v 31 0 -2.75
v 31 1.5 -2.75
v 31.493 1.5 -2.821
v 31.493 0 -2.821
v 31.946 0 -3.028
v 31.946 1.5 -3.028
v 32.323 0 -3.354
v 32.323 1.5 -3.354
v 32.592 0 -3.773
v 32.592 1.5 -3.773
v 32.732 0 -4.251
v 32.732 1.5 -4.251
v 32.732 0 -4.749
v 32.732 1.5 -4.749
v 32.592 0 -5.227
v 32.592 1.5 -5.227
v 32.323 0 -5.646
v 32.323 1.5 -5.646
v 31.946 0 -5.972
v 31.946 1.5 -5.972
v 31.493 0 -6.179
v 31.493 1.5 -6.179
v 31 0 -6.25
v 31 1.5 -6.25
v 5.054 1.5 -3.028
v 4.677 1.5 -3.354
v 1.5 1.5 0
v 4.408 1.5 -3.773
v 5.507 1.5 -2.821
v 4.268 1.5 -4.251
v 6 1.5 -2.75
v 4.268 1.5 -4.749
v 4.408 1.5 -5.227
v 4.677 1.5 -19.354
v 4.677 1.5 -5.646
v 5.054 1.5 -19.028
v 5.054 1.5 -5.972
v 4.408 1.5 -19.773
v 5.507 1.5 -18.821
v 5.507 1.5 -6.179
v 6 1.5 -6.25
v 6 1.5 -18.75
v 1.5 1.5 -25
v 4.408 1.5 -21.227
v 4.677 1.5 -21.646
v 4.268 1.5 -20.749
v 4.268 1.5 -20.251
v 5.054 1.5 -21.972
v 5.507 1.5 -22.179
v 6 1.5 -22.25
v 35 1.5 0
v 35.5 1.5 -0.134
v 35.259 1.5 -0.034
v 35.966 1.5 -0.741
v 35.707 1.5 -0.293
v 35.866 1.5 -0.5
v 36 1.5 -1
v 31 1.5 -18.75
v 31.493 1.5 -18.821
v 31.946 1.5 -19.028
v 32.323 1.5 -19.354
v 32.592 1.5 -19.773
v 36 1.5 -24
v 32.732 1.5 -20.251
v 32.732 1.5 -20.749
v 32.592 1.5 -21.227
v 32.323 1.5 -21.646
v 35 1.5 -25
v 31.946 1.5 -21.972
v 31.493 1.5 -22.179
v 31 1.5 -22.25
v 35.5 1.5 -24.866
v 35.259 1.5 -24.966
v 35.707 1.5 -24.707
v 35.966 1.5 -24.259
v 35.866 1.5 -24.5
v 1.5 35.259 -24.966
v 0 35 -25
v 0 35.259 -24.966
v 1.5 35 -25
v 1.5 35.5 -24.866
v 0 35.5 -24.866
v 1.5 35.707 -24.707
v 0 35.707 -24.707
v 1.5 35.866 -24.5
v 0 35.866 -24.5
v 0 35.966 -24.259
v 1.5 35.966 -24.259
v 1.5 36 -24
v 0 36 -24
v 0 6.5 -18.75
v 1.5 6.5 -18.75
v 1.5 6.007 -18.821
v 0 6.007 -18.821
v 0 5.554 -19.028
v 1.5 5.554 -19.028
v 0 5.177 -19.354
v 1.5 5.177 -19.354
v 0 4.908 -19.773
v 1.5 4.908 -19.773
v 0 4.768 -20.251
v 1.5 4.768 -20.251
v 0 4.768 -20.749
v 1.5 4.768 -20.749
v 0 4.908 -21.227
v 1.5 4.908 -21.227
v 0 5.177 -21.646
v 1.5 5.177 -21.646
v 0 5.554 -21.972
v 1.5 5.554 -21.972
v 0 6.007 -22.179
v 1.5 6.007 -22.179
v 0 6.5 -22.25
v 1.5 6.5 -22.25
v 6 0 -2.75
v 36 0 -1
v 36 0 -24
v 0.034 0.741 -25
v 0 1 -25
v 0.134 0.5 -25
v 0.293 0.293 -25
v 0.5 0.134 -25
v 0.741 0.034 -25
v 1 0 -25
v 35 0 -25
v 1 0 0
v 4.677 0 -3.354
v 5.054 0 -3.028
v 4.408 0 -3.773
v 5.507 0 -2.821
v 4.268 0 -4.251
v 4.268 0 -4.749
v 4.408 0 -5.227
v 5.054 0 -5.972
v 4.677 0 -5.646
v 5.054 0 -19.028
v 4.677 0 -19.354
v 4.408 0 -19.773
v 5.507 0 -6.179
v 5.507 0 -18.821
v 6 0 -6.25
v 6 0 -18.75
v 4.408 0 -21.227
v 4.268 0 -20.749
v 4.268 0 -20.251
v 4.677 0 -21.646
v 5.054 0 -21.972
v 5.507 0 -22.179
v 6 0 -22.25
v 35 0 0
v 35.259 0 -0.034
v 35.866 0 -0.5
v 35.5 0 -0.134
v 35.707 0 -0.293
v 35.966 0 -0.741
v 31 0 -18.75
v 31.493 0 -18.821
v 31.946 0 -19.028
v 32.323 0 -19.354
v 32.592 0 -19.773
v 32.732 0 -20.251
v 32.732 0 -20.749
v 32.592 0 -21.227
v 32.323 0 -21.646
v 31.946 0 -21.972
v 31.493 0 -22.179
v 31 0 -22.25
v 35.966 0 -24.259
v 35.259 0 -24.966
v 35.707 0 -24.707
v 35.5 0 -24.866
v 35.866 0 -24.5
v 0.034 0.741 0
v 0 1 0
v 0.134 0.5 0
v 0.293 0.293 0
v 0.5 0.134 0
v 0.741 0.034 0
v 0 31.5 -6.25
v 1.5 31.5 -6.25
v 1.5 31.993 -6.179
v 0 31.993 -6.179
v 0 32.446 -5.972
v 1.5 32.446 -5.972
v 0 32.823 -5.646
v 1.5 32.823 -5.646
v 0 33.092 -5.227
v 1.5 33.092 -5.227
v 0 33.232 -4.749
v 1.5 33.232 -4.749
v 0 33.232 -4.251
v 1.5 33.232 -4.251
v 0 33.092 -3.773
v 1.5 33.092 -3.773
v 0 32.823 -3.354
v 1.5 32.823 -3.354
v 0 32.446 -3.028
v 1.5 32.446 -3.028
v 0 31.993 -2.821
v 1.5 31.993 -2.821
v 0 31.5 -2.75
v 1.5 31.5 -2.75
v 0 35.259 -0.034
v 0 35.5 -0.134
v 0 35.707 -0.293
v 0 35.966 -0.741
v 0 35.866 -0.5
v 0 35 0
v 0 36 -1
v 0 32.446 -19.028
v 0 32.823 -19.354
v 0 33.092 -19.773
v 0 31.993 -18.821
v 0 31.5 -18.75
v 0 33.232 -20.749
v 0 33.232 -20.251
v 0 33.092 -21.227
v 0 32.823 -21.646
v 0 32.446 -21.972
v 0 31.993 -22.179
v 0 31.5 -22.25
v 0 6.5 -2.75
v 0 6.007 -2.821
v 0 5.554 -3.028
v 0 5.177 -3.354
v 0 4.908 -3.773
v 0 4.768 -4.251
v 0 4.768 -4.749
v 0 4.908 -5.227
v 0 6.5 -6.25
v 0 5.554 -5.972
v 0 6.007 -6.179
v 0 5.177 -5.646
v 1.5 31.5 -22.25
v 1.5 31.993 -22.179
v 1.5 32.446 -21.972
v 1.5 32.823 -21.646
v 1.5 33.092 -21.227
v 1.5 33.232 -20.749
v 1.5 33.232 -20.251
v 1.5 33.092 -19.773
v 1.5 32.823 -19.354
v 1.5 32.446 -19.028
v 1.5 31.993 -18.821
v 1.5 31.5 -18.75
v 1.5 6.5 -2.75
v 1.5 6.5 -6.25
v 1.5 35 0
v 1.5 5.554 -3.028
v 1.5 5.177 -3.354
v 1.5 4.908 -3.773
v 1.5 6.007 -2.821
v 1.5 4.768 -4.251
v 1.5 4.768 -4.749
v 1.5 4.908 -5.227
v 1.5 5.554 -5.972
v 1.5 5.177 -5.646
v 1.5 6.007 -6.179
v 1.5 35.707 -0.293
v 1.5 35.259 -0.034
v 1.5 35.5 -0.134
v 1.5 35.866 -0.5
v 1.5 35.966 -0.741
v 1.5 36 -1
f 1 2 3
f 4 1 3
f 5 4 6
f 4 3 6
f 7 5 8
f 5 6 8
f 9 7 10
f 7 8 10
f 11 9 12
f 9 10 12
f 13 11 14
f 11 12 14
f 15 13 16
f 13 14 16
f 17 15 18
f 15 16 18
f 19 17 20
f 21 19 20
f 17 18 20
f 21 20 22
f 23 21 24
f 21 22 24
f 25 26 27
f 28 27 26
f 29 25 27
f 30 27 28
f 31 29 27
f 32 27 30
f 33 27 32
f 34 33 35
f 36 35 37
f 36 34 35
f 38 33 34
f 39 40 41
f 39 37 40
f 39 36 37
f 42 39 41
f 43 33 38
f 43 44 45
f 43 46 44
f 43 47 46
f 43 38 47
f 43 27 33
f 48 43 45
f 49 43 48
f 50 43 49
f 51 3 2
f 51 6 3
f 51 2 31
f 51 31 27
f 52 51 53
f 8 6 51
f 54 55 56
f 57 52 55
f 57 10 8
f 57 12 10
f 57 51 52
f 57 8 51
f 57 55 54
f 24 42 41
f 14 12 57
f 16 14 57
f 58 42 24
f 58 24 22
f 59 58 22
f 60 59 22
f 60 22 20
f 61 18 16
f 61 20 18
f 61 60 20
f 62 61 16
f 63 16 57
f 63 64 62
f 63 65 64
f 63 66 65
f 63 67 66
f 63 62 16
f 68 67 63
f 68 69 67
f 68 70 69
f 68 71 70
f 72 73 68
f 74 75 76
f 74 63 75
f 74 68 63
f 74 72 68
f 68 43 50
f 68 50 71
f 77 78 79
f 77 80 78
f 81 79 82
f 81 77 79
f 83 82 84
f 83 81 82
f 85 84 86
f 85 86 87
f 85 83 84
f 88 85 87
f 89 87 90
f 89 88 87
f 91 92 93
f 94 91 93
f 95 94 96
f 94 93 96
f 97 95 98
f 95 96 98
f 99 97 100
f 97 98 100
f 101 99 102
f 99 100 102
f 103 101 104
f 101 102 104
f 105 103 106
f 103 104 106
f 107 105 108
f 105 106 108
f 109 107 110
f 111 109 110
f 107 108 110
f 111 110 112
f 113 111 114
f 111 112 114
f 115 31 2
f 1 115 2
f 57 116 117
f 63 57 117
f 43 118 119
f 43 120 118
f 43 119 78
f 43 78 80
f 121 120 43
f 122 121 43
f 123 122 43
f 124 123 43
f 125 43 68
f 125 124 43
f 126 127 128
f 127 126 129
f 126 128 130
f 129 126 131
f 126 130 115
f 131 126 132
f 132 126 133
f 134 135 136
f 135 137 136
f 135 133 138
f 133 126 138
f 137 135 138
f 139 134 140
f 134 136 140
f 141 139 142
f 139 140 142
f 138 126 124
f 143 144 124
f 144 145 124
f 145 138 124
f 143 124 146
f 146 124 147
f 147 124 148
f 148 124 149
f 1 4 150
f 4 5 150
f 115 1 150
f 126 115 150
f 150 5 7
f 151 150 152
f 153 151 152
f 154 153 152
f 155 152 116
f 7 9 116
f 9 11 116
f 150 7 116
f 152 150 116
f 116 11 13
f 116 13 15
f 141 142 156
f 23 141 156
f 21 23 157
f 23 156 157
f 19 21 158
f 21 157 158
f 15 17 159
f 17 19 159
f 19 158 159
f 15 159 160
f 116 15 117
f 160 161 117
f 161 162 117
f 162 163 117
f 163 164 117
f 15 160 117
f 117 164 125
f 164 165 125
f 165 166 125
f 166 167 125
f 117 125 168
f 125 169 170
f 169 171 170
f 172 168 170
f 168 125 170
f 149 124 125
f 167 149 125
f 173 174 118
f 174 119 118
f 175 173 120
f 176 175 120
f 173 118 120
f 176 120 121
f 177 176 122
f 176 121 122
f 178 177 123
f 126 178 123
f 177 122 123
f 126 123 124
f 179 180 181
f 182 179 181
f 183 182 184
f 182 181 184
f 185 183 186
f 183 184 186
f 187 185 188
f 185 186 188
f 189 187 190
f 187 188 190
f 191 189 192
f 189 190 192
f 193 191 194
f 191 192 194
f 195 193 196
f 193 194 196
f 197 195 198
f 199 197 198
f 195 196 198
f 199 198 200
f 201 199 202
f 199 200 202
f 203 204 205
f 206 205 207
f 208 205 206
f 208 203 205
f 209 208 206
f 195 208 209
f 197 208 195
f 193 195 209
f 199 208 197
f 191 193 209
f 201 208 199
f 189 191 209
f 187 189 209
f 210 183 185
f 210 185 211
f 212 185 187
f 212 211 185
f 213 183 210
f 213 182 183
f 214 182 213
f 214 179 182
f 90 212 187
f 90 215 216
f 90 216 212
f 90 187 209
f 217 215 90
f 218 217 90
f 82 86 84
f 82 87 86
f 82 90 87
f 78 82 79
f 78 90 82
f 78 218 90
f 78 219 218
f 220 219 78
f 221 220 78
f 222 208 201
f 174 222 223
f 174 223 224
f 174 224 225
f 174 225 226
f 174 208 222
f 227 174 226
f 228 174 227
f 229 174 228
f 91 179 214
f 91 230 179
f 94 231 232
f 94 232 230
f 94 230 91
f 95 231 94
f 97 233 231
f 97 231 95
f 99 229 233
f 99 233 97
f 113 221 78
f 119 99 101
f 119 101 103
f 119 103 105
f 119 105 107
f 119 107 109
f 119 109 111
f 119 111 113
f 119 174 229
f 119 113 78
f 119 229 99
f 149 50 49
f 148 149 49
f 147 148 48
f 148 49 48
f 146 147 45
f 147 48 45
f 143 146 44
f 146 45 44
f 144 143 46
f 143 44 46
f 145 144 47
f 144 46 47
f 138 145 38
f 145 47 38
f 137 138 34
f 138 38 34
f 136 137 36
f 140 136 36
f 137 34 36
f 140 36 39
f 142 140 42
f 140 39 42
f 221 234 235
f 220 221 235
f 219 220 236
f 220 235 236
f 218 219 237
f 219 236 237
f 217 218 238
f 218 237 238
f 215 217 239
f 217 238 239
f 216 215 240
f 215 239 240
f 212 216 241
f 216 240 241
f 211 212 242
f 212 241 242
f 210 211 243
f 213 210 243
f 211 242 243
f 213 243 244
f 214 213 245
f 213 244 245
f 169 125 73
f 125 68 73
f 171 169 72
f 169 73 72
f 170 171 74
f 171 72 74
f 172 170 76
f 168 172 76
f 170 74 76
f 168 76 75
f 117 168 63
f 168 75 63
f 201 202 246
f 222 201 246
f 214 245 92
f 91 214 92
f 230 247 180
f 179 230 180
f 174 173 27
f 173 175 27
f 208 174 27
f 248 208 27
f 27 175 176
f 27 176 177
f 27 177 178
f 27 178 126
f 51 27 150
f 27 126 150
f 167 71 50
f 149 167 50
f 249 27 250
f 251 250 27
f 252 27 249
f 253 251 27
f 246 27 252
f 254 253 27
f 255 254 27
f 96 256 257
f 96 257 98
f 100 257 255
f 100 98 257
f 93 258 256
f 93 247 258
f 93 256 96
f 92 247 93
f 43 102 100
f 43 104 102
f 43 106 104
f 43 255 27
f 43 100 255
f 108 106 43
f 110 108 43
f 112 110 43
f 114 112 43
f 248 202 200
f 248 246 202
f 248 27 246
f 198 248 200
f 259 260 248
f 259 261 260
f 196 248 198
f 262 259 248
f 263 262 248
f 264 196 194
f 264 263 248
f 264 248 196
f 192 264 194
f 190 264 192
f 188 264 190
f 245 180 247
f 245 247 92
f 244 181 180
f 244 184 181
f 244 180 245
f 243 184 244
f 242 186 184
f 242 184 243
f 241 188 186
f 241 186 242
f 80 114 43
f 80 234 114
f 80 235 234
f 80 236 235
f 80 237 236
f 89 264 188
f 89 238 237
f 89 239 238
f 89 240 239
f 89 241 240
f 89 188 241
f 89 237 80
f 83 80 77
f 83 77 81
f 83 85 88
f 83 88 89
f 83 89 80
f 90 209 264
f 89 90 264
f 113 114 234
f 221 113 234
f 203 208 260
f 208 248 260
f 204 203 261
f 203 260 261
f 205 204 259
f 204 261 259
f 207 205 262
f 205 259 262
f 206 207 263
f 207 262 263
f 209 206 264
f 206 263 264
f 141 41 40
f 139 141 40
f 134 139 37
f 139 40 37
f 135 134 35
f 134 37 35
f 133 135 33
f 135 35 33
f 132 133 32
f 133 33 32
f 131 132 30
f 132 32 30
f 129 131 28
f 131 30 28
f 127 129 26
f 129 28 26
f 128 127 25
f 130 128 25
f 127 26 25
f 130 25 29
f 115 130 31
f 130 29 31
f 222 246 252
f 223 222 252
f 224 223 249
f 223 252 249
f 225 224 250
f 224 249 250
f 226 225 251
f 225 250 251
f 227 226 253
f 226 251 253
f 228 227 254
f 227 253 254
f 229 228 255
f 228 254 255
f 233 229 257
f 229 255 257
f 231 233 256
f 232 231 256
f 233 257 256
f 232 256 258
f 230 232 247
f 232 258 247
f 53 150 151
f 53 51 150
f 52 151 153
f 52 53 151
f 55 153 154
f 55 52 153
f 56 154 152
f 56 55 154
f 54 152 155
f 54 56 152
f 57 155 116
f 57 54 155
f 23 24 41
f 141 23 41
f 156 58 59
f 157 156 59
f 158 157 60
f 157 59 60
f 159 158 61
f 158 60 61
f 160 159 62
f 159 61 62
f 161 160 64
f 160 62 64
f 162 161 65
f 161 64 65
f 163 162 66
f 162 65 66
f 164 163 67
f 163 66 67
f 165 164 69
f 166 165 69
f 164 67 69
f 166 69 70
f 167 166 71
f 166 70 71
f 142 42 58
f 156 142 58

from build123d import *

# Parameters (mm, degrees)
SKETCH1_W           = 36
SKETCH1_H           = 25
BOSS_EXTRUDE1_DEPTH = 36
SKETCH2_W           = 34.5
SKETCH2_H           = 25
CUT_EXTRUDE1_DEPTH  = 34.5
FILLET1_R           = 1
CUT_EXTRUDE2_DEPTH  = 1.5
CUT_EXTRUDE3_DEPTH  = 1.5


with BuildPart() as part:
    # Sketch1 → Boss-Extrude1 (new body)
    with BuildSketch(Plane(origin=(0, 0, 0), x_dir=(1, 0, 0), z_dir=(0, 1, 0))):
        with Locations((18, 12.5)):
            Rectangle(SKETCH1_W, SKETCH1_H)
    extrude(amount=BOSS_EXTRUDE1_DEPTH)

    # Sketch2 → Cut-Extrude1 (cut)
    with BuildSketch(Plane(origin=(0, 36, 0), x_dir=(1, 0, 0), z_dir=(0, 1, 0))):
        with Locations((18.75, 12.5)):
            Rectangle(SKETCH2_W, SKETCH2_H)
    extrude(amount=-CUT_EXTRUDE1_DEPTH, mode=Mode.SUBTRACT)

    # Fillet1
    fillet1_edges = [part.edges().sort_by_distance(p)[0] for p in [
        (0.75, 36, -25),
        (36, 0.75, -25),
        (36, 0.75, 0),
        (0, 0, -12.5),
        (0.75, 36, 0),
    ]]
    fillet(fillet1_edges, radius=FILLET1_R)

    # Sketch3 → Cut-Extrude2 (cut)
    with BuildSketch(Plane(origin=(0, 1.5, 0), x_dir=(1, 0, 0), z_dir=(0, 1, 0))):
        with BuildLine():
            Line((31, 6.25), (6, 6.25))
            ThreePointArc((6, 6.25), (4.25, 4.5), (6, 2.75))
            Line((6, 2.75), (31, 2.75))
            ThreePointArc((31, 2.75), (32.75, 4.5), (31, 6.25))
        make_face()
        with BuildLine():
            Line((6, 18.75), (31, 18.75))
            ThreePointArc((31, 18.75), (32.75, 20.5), (31, 22.25))
            Line((31, 22.25), (6, 22.25))
            ThreePointArc((6, 22.25), (4.25, 20.5), (6, 18.75))
        make_face()
    extrude(amount=-CUT_EXTRUDE2_DEPTH, mode=Mode.SUBTRACT)

    # Sketch4 → Cut-Extrude3 (cut)
    with BuildSketch(Plane(origin=(1.5, 0, 0), x_dir=(0, 0, -1), z_dir=(1, 0, 0))):
        with BuildLine():
            Line((22.25, 6.5), (22.25, 31.5))
            ThreePointArc((22.25, 31.5), (20.5, 33.25), (18.75, 31.5))
            Line((18.75, 31.5), (18.75, 6.5))
            ThreePointArc((18.75, 6.5), (20.5, 4.75), (22.25, 6.5))
        make_face()
        with BuildLine():
            ThreePointArc((6.25, 31.5), (4.5, 33.25), (2.75, 31.5))
            Line((2.75, 31.5), (2.75, 6.5))
            ThreePointArc((2.75, 6.5), (4.5, 4.75), (6.25, 6.5))
            Line((6.25, 6.5), (6.25, 31.5))
        make_face()
    extrude(amount=-CUT_EXTRUDE3_DEPTH, mode=Mode.SUBTRACT)


solid = part.part
